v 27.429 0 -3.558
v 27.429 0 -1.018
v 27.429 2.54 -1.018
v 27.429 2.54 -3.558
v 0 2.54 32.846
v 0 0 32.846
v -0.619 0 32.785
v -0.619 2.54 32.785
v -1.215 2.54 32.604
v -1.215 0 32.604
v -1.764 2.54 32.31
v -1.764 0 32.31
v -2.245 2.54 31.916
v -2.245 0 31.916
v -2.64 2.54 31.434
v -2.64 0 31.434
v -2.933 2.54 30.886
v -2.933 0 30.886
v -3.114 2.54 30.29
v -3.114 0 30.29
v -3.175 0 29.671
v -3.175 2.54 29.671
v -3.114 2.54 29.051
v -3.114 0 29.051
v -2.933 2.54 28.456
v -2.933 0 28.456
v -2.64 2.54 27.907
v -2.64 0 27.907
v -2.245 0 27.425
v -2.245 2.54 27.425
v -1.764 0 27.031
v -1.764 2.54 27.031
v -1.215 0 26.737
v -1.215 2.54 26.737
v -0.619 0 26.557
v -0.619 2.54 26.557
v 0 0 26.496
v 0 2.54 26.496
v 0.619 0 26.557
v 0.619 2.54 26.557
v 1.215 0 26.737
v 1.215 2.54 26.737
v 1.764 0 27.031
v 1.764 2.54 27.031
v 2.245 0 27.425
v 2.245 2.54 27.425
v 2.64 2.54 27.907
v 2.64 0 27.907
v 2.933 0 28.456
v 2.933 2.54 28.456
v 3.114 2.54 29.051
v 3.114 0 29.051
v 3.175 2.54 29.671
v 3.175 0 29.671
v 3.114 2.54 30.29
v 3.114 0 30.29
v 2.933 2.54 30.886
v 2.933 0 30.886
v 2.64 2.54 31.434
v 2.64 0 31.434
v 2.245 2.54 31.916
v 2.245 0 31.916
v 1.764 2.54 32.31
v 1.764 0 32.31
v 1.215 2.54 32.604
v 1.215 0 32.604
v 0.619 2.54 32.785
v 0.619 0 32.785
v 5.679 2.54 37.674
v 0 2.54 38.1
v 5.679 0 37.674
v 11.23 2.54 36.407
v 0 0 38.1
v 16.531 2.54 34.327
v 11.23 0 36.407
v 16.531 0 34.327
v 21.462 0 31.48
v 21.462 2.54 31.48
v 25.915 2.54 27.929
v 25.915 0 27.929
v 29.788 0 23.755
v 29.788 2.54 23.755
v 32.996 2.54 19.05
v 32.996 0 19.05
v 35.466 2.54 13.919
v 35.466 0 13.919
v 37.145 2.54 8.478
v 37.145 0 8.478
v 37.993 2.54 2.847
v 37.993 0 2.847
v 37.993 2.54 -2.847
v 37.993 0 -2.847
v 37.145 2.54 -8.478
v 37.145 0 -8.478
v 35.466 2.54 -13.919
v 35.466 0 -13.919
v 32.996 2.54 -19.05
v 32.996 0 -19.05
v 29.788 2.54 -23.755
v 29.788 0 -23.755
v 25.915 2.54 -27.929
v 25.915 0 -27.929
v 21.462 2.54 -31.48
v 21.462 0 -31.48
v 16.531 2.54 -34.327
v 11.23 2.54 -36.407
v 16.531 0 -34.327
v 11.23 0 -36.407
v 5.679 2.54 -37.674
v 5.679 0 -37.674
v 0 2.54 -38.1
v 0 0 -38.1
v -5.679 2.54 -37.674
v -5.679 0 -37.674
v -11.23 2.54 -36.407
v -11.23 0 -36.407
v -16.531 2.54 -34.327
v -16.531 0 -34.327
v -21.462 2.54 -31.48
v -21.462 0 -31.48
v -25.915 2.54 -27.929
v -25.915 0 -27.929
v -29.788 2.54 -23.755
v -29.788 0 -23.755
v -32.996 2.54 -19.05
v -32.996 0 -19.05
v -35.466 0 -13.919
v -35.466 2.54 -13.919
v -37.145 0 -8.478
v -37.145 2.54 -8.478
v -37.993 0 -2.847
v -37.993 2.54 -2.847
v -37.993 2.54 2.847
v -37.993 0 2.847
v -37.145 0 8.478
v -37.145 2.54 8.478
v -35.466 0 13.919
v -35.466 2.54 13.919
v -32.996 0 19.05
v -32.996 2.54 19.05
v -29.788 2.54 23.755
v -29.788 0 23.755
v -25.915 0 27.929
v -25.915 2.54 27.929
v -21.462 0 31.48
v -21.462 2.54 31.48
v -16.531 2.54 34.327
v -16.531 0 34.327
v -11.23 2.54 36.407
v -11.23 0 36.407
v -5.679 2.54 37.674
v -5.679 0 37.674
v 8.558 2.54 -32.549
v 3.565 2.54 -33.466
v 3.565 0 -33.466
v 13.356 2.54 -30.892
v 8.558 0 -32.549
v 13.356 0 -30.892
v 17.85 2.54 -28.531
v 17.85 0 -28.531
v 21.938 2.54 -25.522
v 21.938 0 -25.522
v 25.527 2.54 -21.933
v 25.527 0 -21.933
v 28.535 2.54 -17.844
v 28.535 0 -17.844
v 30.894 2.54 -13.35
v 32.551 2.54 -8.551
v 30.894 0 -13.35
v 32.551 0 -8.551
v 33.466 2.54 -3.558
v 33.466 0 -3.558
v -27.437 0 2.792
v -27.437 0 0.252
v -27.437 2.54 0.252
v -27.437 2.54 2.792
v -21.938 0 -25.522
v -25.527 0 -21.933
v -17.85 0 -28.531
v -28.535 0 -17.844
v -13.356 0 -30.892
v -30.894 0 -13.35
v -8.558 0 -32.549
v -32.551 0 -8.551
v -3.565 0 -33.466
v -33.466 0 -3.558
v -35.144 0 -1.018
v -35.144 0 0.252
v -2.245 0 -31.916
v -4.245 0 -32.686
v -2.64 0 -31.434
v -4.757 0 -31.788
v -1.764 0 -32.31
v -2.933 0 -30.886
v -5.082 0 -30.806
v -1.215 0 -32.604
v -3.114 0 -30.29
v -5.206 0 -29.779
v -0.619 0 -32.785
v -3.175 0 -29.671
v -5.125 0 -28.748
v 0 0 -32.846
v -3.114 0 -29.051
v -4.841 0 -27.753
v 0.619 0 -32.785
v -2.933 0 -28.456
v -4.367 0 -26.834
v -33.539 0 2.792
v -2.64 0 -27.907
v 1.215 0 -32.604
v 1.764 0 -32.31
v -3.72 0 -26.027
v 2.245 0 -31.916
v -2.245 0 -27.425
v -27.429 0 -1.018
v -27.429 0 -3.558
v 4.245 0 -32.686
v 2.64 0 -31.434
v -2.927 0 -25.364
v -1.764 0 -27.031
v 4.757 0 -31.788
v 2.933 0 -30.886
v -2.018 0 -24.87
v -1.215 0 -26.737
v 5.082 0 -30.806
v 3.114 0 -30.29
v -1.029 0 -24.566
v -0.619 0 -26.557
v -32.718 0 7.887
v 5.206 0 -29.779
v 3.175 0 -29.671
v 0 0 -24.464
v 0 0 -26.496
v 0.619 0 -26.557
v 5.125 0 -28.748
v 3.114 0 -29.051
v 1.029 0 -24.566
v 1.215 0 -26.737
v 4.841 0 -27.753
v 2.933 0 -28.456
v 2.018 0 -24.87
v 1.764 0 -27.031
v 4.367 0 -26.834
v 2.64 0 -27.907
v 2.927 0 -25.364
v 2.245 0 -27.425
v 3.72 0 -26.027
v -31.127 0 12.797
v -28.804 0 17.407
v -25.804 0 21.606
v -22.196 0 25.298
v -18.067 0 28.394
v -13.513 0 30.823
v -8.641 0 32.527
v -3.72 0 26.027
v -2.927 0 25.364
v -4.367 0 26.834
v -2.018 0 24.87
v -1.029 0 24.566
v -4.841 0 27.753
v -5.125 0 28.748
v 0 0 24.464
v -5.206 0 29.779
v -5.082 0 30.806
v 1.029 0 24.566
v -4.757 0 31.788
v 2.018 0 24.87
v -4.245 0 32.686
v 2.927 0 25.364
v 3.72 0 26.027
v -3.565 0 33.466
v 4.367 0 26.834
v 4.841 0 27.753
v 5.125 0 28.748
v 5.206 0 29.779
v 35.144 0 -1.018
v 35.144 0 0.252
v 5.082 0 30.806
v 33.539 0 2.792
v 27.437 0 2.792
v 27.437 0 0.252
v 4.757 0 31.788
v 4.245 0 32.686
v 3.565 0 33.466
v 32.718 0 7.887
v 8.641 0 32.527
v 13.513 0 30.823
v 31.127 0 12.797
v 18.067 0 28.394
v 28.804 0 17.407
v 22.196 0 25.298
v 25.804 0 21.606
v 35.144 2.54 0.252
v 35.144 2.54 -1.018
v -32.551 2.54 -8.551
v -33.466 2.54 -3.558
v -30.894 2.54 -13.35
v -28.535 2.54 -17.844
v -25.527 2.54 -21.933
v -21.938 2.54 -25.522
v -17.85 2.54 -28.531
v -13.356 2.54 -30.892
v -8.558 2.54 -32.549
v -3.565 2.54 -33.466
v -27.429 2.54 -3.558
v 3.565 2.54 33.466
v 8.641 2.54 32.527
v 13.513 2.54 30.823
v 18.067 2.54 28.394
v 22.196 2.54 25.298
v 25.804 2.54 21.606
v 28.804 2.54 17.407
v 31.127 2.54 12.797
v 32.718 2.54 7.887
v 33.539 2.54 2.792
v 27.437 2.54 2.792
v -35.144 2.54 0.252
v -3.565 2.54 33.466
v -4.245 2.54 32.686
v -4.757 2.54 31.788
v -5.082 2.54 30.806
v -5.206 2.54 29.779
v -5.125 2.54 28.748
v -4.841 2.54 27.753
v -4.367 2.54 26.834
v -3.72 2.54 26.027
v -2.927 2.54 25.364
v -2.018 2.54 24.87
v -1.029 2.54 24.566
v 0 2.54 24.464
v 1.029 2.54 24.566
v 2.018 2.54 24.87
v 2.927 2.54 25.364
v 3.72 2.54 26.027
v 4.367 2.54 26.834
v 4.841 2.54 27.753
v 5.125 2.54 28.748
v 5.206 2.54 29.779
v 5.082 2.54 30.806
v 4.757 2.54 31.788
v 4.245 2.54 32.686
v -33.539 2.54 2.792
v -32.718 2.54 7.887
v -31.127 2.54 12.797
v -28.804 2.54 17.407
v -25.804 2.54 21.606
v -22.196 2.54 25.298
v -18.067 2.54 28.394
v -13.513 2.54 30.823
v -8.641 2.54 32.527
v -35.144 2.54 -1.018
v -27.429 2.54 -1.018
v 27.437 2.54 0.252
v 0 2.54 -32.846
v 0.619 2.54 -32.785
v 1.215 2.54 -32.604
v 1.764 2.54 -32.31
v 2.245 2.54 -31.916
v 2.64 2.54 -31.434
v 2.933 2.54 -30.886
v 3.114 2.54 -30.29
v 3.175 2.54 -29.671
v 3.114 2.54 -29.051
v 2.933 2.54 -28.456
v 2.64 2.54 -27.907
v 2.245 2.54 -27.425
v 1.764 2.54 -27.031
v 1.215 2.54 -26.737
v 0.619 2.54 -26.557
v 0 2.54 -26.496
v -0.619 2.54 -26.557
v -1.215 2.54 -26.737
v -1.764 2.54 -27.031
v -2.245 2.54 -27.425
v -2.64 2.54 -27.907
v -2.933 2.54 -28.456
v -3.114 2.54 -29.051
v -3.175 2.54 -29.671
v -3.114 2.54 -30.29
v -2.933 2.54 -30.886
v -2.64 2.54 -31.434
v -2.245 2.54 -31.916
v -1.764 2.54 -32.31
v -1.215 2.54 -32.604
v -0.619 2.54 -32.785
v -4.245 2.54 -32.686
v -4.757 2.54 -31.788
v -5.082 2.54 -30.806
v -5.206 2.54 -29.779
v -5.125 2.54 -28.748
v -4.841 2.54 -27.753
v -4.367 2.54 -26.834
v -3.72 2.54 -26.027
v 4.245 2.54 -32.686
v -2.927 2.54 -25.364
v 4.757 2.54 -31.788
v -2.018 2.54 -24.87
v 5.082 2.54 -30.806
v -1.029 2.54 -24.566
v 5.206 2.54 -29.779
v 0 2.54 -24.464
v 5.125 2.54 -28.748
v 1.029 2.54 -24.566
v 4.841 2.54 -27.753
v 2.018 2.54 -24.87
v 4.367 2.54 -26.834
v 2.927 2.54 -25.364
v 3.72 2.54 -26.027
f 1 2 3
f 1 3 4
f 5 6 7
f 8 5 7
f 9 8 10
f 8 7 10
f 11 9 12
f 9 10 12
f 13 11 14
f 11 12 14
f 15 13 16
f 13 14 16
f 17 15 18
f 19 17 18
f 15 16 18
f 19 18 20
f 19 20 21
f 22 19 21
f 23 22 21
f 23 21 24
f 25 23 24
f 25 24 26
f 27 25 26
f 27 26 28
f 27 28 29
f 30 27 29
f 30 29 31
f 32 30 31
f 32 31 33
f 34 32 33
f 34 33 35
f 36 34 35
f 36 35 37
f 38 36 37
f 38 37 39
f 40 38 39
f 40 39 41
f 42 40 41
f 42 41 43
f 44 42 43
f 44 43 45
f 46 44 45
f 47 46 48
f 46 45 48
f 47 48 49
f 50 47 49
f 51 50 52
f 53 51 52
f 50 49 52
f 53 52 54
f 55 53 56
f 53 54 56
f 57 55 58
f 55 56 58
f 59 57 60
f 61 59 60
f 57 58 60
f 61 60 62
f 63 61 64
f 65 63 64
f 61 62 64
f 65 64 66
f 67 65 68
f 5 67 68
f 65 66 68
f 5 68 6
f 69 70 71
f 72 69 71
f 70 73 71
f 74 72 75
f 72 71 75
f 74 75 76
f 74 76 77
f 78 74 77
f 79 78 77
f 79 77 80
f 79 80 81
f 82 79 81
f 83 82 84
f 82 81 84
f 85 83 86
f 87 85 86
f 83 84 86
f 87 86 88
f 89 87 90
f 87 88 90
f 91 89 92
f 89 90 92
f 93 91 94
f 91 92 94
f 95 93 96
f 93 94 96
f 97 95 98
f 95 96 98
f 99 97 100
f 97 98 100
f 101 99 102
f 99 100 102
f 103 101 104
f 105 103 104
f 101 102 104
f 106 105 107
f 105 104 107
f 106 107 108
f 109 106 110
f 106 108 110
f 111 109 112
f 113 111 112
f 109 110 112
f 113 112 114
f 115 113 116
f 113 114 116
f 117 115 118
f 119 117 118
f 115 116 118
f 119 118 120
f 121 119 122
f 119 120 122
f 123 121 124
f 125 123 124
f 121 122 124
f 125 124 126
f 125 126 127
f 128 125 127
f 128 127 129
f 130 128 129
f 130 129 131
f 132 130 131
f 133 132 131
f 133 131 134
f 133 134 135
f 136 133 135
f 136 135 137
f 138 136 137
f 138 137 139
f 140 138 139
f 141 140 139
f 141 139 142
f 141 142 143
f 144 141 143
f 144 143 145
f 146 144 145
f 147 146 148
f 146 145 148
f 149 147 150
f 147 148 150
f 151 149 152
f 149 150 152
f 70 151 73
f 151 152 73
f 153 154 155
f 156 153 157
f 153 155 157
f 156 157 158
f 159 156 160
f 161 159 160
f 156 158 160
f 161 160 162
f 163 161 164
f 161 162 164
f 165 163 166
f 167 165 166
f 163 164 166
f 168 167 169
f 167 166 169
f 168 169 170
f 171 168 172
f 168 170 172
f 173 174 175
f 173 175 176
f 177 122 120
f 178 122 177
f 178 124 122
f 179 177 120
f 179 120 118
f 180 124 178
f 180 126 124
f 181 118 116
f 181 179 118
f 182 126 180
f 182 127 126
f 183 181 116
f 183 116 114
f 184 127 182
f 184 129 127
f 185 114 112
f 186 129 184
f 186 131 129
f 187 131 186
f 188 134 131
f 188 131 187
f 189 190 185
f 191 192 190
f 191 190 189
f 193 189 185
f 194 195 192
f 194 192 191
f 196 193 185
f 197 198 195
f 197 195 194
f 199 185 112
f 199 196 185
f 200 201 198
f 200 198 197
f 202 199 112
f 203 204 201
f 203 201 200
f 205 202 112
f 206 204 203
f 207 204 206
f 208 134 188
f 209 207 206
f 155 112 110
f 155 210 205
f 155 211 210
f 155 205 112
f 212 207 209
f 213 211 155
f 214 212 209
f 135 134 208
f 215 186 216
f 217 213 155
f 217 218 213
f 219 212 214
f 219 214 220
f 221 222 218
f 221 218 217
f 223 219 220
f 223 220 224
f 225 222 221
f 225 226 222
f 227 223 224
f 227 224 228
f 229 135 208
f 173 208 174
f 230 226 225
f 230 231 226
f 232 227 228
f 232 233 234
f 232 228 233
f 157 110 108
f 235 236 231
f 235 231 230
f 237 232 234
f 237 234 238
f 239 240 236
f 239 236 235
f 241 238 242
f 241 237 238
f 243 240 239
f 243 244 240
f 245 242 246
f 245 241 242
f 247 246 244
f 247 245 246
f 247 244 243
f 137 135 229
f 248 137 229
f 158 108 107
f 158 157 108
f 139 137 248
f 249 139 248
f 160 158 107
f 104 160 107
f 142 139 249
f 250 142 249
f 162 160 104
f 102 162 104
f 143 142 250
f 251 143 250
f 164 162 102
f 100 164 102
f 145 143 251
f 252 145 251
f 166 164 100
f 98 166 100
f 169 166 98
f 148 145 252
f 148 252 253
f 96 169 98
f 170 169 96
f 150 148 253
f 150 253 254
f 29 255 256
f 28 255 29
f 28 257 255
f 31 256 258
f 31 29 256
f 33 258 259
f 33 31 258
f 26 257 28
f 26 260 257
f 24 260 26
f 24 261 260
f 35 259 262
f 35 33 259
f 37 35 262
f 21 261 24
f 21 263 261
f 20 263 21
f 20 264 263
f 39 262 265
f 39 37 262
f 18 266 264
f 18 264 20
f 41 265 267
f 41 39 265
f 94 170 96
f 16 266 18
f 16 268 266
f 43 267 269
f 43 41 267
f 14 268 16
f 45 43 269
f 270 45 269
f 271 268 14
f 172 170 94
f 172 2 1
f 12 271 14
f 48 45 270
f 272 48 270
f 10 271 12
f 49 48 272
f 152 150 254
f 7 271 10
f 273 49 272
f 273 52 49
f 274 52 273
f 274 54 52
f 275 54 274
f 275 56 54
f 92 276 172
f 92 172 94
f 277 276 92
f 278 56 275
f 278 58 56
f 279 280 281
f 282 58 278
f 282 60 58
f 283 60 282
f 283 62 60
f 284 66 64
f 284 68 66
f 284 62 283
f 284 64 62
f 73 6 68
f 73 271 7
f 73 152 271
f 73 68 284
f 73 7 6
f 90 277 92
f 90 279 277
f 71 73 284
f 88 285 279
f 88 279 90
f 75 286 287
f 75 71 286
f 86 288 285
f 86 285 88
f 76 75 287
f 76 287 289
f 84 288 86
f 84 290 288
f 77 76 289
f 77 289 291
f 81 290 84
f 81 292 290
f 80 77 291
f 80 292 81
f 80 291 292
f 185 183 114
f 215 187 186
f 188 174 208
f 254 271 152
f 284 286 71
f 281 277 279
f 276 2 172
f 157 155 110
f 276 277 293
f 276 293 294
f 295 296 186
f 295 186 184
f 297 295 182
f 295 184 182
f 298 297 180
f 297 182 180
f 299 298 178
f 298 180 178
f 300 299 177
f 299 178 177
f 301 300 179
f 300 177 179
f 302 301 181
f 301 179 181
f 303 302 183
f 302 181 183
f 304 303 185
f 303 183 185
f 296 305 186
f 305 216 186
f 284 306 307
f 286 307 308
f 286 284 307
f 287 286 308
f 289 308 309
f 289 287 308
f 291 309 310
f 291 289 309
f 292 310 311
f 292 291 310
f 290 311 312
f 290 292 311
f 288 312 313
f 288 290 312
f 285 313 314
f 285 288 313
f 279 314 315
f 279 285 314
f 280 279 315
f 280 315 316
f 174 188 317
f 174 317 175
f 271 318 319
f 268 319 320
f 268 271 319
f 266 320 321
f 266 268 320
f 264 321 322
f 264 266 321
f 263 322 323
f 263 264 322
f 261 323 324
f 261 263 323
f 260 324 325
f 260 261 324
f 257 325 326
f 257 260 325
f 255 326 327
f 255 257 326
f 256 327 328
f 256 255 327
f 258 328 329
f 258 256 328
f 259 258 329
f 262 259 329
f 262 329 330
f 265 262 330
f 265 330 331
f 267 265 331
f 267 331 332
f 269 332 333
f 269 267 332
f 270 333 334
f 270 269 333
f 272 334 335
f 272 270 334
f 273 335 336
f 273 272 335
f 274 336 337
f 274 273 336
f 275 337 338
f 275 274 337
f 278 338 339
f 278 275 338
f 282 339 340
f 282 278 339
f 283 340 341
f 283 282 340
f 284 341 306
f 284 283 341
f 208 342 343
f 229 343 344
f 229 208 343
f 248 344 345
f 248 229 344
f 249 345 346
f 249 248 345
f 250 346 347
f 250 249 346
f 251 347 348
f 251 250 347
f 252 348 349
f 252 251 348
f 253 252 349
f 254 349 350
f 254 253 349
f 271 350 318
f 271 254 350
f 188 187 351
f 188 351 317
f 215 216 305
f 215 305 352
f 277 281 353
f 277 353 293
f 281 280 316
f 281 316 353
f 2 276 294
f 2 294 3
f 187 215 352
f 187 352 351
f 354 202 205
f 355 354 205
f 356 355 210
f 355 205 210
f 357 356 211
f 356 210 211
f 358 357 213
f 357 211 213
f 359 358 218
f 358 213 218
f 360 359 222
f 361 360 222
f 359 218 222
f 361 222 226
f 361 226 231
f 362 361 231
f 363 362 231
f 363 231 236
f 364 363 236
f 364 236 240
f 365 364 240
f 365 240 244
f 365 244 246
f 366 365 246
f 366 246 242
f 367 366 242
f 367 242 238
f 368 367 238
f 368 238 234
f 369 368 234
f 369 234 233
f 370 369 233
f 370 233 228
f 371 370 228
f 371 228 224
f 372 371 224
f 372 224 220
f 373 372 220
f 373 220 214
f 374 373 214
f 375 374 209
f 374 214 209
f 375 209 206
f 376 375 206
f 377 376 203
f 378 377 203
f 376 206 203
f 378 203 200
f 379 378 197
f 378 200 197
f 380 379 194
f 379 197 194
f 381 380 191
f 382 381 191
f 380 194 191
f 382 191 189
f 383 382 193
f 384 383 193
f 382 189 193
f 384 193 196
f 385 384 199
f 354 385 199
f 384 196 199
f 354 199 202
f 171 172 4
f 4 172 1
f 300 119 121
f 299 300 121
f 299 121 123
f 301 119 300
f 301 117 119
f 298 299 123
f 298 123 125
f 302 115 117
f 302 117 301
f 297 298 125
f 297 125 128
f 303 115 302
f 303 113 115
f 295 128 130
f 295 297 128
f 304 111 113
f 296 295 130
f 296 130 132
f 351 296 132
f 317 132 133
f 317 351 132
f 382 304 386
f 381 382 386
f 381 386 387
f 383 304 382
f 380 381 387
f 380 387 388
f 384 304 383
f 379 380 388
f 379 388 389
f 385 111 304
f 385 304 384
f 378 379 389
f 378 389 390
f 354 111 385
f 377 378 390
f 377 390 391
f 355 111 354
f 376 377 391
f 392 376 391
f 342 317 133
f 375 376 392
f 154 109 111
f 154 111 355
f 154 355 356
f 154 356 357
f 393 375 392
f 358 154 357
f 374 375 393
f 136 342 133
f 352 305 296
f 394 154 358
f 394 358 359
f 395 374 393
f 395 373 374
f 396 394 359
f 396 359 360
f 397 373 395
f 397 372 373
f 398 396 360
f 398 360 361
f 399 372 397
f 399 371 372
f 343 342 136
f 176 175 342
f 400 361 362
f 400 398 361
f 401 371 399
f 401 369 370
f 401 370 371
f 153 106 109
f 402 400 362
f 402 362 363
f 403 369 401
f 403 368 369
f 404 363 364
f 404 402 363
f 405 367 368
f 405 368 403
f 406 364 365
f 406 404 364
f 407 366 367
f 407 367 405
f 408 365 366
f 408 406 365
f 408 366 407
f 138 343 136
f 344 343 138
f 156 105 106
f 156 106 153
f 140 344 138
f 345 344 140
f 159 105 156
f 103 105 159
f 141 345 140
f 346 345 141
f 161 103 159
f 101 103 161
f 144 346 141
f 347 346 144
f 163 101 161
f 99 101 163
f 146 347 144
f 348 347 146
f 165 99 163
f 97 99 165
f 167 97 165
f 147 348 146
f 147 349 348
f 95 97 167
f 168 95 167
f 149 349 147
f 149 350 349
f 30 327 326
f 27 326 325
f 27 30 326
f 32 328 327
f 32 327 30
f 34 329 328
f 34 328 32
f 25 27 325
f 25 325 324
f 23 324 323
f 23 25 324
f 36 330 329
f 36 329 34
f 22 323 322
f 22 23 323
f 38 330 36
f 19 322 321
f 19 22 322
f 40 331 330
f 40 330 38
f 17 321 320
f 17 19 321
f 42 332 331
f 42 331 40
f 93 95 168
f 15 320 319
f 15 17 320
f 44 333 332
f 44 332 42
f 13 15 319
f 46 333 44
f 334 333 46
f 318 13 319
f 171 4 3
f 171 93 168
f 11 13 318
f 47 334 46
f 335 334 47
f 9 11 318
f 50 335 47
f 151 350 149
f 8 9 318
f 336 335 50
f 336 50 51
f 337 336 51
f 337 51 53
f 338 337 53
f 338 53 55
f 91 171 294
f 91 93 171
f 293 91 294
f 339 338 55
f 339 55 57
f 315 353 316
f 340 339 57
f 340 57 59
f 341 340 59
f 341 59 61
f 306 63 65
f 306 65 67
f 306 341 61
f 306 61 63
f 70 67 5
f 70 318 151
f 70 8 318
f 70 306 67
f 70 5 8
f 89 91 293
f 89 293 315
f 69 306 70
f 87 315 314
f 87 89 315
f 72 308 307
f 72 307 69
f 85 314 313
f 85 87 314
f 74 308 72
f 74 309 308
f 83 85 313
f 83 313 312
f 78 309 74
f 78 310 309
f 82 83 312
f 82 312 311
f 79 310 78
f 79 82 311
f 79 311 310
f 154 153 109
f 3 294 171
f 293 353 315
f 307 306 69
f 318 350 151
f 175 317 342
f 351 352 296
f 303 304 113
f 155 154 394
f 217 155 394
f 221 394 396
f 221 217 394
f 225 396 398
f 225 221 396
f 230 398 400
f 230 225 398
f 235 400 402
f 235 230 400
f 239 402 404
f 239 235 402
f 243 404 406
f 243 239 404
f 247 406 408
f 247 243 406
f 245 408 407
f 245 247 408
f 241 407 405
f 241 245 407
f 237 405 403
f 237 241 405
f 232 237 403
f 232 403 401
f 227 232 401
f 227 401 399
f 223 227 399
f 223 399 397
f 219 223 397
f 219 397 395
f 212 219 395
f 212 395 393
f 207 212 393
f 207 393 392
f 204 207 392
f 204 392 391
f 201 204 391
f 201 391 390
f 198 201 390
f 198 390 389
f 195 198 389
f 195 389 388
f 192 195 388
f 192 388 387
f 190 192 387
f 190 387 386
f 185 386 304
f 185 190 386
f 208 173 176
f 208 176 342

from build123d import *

# Parameters (mm, degrees)
SKETCH1_R           = 38.1
BOSS_EXTRUDE1_DEPTH = 50.8
SKETCH4_R           = 38.1
BOSS_EXTRUDE2_DEPTH = 50.8
SKETCH5_R           = 5.207
SKETCH5_R_2         = 3.175
BOSS_EXTRUDE3_DEPTH = 101.6
CUT_EXTRUDE1_START  = -99.06
SKETCH7_R           = 38.1
CUT_EXTRUDE1_DEPTH  = 99.06


with BuildPart() as part:
    # Sketch1 → Boss-Extrude1 (new body)
    with BuildSketch(Plane(origin=(0, 0, 0), x_dir=(1, 0, 0), z_dir=(0, 1, 0))):
        with Locations(Location((0, 0, 0), (0, 0, 270))):
            Circle(SKETCH1_R)
        with BuildLine():
            Line((-35.143970714, 1.018475327), (-35.143970714, -0.251524673))
            Line((-35.143970714, -0.251524673), (-27.437089542, -0.251524673))
            Line((-27.437089542, -0.251524673), (-27.437089542, -2.791524673))
            Line((-27.437089542, -2.791524673), (-33.539028236, -2.791524673))
            ThreePointArc((-33.539028236, -2.791524673), (0, -33.655), (33.539028236, -2.791524673))
            Line((33.539028236, -2.791524673), (27.437089542, -2.791524673))
            Line((27.437089542, -2.791524673), (27.437089542, -0.251524673))
            Line((27.437089542, -0.251524673), (35.143970714, -0.251524673))
            Line((35.143970714, -0.251524673), (35.143970714, 1.018475327))
            Line((35.143970714, 1.018475327), (27.42889968, 1.018475327))
            Line((27.42889968, 1.018475327), (27.42889968, 3.558475327))
            Line((27.42889968, 3.558475327), (33.466345458, 3.558475327))
            ThreePointArc((33.466345458, 3.558475327), (0, 33.655), (-33.466345458, 3.558475327))
            Line((-33.466345458, 3.558475327), (-27.42889968, 3.558475327))
            Line((-27.42889968, 3.558475327), (-27.42889968, 1.018475327))
            Line((-27.42889968, 1.018475327), (-35.143970714, 1.018475327))
        make_face(mode=Mode.SUBTRACT)
    extrude(amount=BOSS_EXTRUDE1_DEPTH)

    # Sketch4 → Boss-Extrude2 (add)
    with BuildSketch(Plane(origin=(0, 50.8, 0), x_dir=(1, 0, 0), z_dir=(0, 1, 0))):
        with Locations(Location((0, 0, 0), (0, 0, 270))):
            Circle(SKETCH4_R)
        with BuildLine():
            Line((33.466345458, 3.558475327), (-33.466345458, 3.558475327))
            ThreePointArc((-33.466345458, 3.558475327), (0, 33.655), (33.466345458, 3.558475327))
        make_face(mode=Mode.SUBTRACT)
        with BuildLine():
            Line((-27.42889968, 1.018475327), (27.42889968, 1.018475327))
            Line((27.42889968, 1.018475327), (27.432994611, 0.383475327))
            Line((27.432994611, 0.383475327), (33.652815212, 0.383475327))
            ThreePointArc((33.652815212, 0.383475327), (0, -33.655), (-33.652815212, 0.383475327))
            Line((-33.652815212, 0.383475327), (-27.432994611, 0.383475327))
            Line((-27.432994611, 0.383475327), (-27.42889968, 1.018475327))
        make_face(mode=Mode.SUBTRACT)
    extrude(amount=BOSS_EXTRUDE2_DEPTH)

    # Sketch5 → Boss-Extrude3 (add)
    # profile 1 of 2: a face of its own
    with BuildSketch(Plane.XZ):
        with Locations((0, -29.670562634)):
            Circle(SKETCH5_R)
        with Locations(Location((0, -29.670562634, 0), (0, 0, 270))):
            Circle(SKETCH5_R_2, mode=Mode.SUBTRACT)
    # profile 2 of 2: a face of its own
    with BuildSketch(Plane.XZ):
        with Locations((0, 29.670562634)):
            Circle(SKETCH5_R)
        with Locations(Location((0, 29.670562634, 0), (0, 0, 90))):
            Circle(SKETCH5_R_2, mode=Mode.SUBTRACT)
    extrude(amount=-BOSS_EXTRUDE3_DEPTH)

    # Sketch7 → Cut-Extrude1 (cut)
    with BuildSketch(Plane(origin=(0, 101.6, 0), x_dir=(1, 0, 0), z_dir=(0, 1, 0)).offset(CUT_EXTRUDE1_START)):
        with Locations(Location((0, 0, 0), (0, 0, 270))):
            Circle(SKETCH7_R)
    extrude(amount=CUT_EXTRUDE1_DEPTH, mode=Mode.SUBTRACT)


solid = part.part
